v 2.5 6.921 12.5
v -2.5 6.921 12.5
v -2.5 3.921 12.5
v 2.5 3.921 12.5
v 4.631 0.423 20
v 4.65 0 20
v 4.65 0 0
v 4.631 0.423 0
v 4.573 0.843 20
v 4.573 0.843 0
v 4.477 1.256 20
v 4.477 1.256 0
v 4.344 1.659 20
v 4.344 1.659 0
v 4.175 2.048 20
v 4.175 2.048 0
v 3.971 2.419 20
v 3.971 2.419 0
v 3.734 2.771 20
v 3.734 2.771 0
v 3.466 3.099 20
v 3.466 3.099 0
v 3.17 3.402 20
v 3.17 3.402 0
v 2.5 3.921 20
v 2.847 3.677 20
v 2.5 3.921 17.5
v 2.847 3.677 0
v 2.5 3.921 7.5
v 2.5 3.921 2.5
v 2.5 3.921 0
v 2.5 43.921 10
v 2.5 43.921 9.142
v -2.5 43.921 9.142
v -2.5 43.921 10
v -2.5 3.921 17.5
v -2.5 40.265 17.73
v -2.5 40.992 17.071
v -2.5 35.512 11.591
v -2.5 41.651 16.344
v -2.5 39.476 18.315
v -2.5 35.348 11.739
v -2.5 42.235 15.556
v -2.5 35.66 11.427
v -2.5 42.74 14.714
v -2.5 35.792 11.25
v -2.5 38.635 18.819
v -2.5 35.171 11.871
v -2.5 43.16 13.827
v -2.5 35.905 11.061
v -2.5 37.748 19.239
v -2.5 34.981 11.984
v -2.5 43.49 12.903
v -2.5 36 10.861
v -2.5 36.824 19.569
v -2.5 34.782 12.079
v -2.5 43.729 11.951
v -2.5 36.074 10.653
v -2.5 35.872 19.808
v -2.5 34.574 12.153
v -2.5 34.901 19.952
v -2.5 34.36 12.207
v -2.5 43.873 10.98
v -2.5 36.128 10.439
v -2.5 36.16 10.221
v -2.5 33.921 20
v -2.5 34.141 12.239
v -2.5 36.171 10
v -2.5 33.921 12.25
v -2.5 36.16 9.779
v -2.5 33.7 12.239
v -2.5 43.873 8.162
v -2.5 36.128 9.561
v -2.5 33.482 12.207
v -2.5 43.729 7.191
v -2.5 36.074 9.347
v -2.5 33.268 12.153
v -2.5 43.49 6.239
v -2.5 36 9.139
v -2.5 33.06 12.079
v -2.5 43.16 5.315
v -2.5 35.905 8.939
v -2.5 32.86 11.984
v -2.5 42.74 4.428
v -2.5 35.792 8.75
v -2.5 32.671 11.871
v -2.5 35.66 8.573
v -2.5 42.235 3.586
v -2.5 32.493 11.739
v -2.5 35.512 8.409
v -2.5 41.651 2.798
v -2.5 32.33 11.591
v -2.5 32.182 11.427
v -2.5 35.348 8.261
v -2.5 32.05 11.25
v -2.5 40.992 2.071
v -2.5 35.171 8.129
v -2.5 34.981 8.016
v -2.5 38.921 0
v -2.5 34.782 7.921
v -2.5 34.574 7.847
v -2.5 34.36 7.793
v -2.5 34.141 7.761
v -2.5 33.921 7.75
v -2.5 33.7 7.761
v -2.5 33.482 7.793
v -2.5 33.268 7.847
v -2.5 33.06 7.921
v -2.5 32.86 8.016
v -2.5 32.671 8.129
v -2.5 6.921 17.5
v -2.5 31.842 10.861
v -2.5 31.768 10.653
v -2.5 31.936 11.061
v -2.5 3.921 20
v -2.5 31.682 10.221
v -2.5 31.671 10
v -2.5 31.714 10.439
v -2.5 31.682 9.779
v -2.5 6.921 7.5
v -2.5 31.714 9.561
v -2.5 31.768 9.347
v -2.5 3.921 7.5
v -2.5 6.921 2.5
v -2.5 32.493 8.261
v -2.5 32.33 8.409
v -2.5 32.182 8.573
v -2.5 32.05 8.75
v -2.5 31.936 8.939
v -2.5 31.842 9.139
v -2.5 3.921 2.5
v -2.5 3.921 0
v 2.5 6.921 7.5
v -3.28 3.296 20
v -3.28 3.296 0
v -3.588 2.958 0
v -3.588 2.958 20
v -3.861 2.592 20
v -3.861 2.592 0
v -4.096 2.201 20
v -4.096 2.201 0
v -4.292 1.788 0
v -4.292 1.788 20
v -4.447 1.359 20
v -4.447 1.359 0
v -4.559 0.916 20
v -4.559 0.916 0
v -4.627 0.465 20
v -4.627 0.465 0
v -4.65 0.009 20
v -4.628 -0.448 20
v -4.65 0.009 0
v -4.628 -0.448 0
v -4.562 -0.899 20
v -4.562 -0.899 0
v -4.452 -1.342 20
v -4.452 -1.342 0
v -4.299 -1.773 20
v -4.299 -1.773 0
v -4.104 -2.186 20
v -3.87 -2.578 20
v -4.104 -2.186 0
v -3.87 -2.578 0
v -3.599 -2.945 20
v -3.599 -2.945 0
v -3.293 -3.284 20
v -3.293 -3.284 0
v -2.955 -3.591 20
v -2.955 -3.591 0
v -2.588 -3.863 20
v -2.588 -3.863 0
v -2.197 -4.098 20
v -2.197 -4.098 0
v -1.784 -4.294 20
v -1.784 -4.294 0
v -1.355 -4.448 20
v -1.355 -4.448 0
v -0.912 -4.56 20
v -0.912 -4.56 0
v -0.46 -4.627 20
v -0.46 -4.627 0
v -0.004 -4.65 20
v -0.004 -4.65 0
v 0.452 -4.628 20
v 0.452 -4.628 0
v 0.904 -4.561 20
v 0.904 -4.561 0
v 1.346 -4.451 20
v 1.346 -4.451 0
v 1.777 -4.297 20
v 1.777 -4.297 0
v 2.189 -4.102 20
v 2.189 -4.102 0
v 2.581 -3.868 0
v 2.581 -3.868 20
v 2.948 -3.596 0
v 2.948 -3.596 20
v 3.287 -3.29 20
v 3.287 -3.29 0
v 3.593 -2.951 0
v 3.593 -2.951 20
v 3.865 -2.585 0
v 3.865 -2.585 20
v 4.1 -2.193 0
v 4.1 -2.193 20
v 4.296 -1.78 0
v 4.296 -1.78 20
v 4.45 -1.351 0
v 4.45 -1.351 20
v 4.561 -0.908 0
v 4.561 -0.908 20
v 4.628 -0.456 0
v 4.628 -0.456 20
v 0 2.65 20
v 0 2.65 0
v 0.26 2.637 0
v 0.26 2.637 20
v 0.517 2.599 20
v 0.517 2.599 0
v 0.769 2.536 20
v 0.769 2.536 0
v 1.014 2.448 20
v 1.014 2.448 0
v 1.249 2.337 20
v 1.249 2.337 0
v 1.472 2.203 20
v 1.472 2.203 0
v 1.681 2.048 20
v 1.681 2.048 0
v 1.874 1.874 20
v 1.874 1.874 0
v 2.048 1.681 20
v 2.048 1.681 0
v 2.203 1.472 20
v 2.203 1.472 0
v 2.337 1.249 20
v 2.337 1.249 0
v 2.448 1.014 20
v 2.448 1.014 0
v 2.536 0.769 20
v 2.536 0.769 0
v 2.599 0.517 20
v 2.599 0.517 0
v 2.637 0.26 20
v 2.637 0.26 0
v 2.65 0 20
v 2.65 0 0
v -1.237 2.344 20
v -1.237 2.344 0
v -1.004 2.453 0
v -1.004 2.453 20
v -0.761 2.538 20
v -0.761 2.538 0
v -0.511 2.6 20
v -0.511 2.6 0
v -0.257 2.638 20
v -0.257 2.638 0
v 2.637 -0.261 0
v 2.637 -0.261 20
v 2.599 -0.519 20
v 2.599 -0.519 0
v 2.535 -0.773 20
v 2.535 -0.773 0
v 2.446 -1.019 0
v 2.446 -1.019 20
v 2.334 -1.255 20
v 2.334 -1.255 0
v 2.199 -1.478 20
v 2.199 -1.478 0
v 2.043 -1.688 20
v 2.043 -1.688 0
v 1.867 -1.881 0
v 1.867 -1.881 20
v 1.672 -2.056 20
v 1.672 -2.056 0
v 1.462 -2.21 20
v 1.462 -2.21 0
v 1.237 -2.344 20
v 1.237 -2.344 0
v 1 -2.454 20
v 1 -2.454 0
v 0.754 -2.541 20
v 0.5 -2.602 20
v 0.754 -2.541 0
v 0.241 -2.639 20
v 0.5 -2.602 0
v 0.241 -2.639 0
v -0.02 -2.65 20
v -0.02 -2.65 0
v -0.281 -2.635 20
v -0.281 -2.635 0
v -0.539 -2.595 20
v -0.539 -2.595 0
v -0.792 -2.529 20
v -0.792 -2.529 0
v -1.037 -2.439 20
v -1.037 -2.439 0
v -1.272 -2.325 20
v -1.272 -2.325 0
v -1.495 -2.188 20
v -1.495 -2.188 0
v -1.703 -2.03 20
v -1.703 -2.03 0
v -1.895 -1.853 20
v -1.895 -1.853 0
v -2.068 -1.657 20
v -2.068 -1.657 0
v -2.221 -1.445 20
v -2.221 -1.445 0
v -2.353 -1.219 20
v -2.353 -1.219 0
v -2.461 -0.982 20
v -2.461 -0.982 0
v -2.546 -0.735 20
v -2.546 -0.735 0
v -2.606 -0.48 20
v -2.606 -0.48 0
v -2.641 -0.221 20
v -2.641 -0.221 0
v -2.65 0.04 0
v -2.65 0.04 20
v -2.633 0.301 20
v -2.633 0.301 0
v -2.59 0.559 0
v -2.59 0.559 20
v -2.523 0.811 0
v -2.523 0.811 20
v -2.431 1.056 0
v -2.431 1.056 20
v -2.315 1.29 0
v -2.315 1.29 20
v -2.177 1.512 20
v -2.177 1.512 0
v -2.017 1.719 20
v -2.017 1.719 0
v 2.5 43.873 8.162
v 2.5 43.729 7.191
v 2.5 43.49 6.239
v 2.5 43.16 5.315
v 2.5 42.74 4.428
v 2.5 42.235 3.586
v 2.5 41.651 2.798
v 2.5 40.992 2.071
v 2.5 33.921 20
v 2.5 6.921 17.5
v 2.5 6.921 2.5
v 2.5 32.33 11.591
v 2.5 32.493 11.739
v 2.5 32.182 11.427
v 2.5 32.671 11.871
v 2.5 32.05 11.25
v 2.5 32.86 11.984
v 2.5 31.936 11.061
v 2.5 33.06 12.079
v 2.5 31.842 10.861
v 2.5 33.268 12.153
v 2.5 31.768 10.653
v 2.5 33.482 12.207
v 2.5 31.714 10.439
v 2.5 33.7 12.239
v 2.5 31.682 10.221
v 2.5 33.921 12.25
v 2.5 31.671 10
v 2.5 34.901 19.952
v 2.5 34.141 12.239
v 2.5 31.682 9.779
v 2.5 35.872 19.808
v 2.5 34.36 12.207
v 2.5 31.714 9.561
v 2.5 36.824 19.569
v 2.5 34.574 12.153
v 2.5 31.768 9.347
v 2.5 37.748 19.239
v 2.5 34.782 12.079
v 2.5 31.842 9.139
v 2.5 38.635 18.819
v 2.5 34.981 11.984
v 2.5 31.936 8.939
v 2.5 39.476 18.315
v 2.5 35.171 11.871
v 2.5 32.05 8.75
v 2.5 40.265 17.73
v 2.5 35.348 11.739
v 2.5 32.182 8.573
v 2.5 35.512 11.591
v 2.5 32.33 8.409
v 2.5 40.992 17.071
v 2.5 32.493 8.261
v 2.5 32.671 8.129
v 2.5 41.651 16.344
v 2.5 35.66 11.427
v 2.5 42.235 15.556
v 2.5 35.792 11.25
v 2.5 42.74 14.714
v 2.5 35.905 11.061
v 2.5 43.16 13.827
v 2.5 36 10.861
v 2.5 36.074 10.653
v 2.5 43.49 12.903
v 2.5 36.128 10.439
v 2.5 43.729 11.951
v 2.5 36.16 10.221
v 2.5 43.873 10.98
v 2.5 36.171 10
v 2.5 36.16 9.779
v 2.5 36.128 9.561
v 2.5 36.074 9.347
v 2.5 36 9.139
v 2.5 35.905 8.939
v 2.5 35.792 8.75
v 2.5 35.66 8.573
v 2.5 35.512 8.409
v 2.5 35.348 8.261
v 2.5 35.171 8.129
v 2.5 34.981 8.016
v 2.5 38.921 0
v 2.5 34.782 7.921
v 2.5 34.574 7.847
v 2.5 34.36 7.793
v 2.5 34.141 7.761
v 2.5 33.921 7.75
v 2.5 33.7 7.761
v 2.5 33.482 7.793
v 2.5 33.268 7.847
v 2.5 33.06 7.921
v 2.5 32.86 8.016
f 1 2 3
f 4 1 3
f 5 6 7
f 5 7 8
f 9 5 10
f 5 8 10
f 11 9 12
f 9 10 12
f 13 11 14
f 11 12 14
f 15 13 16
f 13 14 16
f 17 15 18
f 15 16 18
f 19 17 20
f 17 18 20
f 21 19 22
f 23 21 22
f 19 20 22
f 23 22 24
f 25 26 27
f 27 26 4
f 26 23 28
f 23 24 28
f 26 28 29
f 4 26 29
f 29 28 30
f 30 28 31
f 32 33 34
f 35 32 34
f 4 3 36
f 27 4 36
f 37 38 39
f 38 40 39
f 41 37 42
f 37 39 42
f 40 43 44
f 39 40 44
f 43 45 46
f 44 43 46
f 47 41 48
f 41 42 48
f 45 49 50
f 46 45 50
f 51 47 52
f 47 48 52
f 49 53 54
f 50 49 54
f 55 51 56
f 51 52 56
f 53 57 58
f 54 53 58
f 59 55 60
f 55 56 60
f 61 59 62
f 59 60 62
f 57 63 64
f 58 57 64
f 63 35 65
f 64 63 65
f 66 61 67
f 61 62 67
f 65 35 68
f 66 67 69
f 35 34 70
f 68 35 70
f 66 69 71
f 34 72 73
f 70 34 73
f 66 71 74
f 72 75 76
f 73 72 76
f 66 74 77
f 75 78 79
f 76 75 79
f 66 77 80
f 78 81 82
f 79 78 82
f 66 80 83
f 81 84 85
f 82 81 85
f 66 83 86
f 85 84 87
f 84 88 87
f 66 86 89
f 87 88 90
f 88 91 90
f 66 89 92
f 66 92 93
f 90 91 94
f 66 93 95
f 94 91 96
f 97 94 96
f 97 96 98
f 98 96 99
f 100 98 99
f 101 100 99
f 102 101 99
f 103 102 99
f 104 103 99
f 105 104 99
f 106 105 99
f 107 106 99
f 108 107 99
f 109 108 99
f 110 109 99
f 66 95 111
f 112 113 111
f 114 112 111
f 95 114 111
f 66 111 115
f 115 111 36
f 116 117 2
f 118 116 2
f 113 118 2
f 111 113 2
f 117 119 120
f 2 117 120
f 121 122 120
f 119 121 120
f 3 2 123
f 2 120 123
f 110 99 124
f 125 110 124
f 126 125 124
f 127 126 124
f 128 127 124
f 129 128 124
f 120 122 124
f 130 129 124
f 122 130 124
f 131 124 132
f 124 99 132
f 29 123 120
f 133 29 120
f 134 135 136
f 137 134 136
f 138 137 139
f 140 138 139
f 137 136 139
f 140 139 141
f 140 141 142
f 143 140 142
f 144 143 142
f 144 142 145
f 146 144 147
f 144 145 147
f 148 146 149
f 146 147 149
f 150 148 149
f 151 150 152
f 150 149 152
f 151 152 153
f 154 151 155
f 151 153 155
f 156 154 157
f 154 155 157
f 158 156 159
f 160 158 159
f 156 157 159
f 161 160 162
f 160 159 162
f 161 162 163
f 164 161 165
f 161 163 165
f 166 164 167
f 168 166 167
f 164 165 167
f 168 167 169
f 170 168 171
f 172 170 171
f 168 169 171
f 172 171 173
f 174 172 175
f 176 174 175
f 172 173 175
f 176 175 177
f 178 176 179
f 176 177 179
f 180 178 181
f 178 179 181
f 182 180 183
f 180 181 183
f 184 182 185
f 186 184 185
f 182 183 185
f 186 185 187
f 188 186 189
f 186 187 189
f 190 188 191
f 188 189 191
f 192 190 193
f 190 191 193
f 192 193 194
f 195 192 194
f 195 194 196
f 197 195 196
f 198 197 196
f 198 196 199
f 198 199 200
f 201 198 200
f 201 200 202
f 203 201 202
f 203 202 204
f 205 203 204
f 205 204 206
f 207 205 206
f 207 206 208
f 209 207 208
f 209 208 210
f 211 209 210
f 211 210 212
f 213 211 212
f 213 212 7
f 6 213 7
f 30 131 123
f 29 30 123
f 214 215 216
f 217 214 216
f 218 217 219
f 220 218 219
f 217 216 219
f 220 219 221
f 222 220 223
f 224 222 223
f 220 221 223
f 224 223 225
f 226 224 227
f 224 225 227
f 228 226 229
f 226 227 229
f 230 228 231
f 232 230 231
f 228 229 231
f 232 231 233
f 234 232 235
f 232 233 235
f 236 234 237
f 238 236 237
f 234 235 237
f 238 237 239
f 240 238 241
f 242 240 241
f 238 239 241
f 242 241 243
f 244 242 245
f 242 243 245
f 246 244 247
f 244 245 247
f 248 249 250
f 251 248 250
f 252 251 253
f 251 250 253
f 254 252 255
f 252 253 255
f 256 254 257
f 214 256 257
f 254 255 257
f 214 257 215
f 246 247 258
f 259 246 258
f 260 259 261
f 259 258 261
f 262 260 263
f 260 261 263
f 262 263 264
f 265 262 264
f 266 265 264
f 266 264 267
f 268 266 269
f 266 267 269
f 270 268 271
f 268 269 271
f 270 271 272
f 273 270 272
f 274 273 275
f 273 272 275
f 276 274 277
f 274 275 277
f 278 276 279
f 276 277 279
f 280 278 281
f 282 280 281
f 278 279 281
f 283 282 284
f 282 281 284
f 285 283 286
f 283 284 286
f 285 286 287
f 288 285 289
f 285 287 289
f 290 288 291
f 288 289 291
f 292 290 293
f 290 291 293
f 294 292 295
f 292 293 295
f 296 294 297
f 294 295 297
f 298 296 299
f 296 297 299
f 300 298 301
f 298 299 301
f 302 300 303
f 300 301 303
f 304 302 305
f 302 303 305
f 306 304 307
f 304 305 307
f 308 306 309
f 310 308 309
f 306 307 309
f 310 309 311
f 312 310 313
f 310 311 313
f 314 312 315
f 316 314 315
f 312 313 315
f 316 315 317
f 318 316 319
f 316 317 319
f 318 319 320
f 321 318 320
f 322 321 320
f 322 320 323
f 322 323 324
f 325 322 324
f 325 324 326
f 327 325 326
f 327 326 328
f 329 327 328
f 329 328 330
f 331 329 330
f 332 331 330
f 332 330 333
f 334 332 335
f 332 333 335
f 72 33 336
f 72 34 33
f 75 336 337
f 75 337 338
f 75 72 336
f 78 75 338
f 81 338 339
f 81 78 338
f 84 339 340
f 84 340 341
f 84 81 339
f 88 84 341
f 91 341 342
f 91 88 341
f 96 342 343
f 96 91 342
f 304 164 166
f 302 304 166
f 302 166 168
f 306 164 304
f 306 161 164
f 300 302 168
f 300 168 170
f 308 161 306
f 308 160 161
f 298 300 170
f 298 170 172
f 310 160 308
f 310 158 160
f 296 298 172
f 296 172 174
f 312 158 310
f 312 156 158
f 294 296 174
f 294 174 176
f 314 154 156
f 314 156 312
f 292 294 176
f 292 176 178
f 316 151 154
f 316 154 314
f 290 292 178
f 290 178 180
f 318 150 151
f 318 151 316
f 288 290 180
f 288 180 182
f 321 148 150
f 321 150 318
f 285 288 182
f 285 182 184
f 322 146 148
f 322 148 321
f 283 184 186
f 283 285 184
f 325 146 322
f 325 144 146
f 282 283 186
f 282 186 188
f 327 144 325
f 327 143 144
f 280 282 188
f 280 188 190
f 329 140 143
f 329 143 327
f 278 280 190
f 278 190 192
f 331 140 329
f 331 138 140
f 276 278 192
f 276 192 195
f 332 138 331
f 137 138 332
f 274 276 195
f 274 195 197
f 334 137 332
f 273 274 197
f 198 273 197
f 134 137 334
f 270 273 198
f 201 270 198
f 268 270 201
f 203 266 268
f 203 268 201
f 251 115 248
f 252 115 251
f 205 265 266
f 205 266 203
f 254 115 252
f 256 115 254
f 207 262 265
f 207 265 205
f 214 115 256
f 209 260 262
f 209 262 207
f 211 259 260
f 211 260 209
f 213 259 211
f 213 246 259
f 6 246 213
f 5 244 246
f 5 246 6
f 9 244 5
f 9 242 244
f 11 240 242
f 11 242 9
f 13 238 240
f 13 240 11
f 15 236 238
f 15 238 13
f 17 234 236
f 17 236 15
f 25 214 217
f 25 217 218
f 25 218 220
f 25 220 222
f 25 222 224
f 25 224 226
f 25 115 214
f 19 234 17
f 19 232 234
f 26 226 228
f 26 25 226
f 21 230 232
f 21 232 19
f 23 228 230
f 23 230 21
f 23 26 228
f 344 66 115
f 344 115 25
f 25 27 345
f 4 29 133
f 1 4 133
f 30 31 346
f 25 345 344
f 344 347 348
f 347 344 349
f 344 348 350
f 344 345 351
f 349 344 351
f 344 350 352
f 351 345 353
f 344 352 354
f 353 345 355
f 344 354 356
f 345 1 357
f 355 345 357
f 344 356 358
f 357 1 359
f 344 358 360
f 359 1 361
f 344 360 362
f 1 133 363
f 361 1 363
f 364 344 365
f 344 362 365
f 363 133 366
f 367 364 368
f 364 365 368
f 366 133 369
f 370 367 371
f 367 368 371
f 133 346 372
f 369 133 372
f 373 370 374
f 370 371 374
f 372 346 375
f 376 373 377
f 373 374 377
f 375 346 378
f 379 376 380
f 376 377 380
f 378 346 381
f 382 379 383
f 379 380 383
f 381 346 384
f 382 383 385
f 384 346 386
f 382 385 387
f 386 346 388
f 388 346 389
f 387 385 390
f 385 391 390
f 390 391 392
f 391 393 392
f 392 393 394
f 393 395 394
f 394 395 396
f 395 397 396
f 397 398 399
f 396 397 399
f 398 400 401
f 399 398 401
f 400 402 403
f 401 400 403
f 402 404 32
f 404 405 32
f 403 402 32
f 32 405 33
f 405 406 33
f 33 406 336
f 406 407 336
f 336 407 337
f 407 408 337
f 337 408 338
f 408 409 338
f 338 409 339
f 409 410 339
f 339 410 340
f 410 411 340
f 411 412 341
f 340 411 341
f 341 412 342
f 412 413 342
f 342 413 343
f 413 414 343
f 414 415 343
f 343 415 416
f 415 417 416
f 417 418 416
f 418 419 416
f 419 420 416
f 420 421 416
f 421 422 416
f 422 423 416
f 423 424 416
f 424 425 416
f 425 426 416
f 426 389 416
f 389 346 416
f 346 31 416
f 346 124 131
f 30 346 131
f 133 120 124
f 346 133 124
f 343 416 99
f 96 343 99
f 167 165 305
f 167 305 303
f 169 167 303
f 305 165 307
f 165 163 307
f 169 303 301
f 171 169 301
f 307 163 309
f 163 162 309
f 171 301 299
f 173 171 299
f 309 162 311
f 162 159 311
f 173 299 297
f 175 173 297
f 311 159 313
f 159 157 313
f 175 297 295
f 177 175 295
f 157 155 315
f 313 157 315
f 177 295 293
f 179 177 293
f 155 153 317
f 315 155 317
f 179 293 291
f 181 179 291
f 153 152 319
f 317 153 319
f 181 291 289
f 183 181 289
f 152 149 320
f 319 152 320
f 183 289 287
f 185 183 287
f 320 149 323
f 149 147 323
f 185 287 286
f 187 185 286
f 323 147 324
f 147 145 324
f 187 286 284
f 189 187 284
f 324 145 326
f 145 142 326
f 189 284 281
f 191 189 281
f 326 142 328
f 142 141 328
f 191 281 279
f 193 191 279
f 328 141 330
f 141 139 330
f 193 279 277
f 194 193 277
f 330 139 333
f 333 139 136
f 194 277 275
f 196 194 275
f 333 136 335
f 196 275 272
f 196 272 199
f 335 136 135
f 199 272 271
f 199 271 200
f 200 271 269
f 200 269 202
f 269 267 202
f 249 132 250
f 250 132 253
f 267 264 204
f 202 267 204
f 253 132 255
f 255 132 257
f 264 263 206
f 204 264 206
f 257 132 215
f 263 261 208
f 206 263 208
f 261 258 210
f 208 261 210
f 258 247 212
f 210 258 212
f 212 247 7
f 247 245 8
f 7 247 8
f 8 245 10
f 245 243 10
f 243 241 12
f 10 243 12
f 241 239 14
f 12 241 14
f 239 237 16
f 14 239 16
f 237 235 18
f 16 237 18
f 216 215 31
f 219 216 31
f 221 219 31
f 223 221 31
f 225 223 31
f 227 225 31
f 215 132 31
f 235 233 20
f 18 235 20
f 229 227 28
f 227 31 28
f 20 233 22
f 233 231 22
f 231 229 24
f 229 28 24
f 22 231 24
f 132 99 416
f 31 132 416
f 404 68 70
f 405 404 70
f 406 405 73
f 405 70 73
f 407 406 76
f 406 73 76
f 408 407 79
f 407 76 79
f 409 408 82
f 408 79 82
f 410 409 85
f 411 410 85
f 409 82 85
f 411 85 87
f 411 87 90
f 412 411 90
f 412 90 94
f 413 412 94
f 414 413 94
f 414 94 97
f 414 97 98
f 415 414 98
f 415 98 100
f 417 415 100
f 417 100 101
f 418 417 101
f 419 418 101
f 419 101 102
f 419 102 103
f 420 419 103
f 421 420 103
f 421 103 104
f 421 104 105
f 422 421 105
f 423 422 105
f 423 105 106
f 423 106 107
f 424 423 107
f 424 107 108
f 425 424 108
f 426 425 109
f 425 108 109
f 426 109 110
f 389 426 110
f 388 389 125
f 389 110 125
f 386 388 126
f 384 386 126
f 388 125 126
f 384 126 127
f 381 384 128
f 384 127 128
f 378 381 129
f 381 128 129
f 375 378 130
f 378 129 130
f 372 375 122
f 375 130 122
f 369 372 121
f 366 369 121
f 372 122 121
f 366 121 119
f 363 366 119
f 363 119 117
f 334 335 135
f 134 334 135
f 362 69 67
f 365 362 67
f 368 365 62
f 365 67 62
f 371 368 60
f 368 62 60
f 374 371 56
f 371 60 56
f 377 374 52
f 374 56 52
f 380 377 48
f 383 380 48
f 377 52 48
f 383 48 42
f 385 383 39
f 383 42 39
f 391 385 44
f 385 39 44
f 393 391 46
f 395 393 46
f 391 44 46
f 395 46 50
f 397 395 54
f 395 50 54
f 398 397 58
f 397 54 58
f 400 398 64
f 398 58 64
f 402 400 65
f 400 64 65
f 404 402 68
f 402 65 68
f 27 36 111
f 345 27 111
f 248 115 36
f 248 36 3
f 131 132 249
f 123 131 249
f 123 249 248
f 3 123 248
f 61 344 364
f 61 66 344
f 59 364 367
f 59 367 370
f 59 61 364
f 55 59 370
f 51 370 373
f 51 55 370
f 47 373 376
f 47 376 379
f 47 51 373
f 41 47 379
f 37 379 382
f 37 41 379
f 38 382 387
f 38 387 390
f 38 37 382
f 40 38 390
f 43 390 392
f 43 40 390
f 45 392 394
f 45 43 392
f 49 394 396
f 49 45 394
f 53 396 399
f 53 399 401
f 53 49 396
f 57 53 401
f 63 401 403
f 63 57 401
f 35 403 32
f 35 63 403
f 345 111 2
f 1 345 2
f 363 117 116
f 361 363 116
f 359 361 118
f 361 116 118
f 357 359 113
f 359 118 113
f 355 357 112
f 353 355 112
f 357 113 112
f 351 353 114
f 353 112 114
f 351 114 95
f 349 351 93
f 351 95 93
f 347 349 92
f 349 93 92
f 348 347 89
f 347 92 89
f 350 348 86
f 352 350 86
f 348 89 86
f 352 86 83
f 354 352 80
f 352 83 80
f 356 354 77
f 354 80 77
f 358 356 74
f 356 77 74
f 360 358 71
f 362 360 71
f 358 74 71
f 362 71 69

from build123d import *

# Parameters (mm, degrees)
F1_DEPTH = 20
F3_DEPTH = 7.151
F4_R     = 10
F5_SIZE  = 5
F6_R     = 10


with BuildPart() as f1:
    # F0 (on Top) → F1 (new body)
    with BuildSketch(Plane.XY):
        with BuildLine():
            ThreePointArc((2.65, 0), (-0.9156644986, -2.4867767343), (-2.0172139819, 1.7185306955))
            Line((-2.0172139819, 1.7185306955), (-2.6488466474, 2.5070635361))
            Line((-2.6488466474, 2.5070635361), (-3.2804793129, 3.2955963767))
            ThreePointArc((-3.2804793129, 3.2955963767), (-1.7844146372, -4.2939916631), (4.65, 0))
            ThreePointArc((4.65, 0), (4.0772233199, 2.2357884515), (2.5, 3.920777984))
            ThreePointArc((2.5, 3.920777984), (1.3020910825, 4.4639734333), (0, 4.65))
            Line((0, 4.65), (0, 2.65))
            ThreePointArc((0, 2.65), (1.8738329701, 1.8738329701), (2.65, 0))
        make_face()
        with BuildLine():
            Line((0, 43.920777984), (0, 4.65))
            ThreePointArc((0, 4.65), (1.3020910825, 4.4639734333), (2.5, 3.920777984))
            Line((2.5, 3.920777984), (2.5, 43.920777984))
            Line((2.5, 43.920777984), (0, 43.920777984))
        make_face()
        with BuildLine():
            ThreePointArc((-1.236734669, 2.3437123028), (-0.6370488198, 2.572288631), (0, 2.65))
            Line((0, 2.65), (0, 4.65))
            ThreePointArc((0, 4.65), (-1.3020910825, 4.4639734333), (-2.5, 3.920777984))
            Line((-2.5, 3.920777984), (-1.8683673345, 3.1322451434))
            Line((-1.8683673345, 3.1322451434), (-1.236734669, 2.3437123028))
        make_face()
        with BuildLine():
            ThreePointArc((-2.5, 3.920777984), (-1.3020910825, 4.4639734333), (0, 4.65))
            Line((0, 4.65), (0, 43.920777984))
            Line((0, 43.920777984), (-2.5, 43.920777984))
            Line((-2.5, 43.920777984), (-2.5, 3.920777984))
        make_face()
    extrude(amount=F1_DEPTH)

    # F2 (on face) → F3 (cut, through all)
    with BuildSketch(Plane(origin=(-2.5, 0, 0), x_dir=(0, -1, 0), z_dir=(-1, 0, 0))):
        with BuildLine():
            Line((-33.920777984, 10), (-33.920777984, 12.25))
            ThreePointArc((-33.920777984, 12.25), (-35.5117682417, 11.5909902577), (-36.170777984, 10))
            Line((-36.170777984, 10), (-33.920777984, 10))
        make_face()
        with BuildLine():
            ThreePointArc((-36.170777984, 10), (-33.920777984, 7.75), (-31.670777984, 10))
            ThreePointArc((-31.670777984, 10), (-32.3297877264, 11.5909902577), (-33.920777984, 12.25))
            Line((-33.920777984, 12.25), (-33.920777984, 10))
            Line((-33.920777984, 10), (-36.170777984, 10))
        make_face()
        Polygon((-3.920777984, 17.5), (-5.420777984, 17.5), (-6.920777984, 17.5), (-6.920777984, 12.5), (-3.920777984, 12.5), align=None)
        Polygon((-6.920777984, 2.5), (-5.420777984, 2.5), (-3.920777984, 2.5), (-3.920777984, 7.5), (-6.920777984, 7.5), align=None)
    extrude(amount=-F3_DEPTH, mode=Mode.SUBTRACT)

    # F4
    f4_edges = [f1.edges().sort_by_distance(p)[0] for p in [
        (0, 43.920778, 20),
    ]]
    fillet(f4_edges, radius=F4_R)

    # F5
    f5_edges = [f1.edges().sort_by_distance(p)[0] for p in [
        (0, 43.920778, 0),
    ]]
    chamfer(f5_edges, length=F5_SIZE)

    # F6
    f6_edges = [f1.edges().sort_by_distance(p)[0] for p in [
        (0, 43.920778, 5),
    ]]
    fillet(f6_edges, radius=F6_R)


solid = f1.part
